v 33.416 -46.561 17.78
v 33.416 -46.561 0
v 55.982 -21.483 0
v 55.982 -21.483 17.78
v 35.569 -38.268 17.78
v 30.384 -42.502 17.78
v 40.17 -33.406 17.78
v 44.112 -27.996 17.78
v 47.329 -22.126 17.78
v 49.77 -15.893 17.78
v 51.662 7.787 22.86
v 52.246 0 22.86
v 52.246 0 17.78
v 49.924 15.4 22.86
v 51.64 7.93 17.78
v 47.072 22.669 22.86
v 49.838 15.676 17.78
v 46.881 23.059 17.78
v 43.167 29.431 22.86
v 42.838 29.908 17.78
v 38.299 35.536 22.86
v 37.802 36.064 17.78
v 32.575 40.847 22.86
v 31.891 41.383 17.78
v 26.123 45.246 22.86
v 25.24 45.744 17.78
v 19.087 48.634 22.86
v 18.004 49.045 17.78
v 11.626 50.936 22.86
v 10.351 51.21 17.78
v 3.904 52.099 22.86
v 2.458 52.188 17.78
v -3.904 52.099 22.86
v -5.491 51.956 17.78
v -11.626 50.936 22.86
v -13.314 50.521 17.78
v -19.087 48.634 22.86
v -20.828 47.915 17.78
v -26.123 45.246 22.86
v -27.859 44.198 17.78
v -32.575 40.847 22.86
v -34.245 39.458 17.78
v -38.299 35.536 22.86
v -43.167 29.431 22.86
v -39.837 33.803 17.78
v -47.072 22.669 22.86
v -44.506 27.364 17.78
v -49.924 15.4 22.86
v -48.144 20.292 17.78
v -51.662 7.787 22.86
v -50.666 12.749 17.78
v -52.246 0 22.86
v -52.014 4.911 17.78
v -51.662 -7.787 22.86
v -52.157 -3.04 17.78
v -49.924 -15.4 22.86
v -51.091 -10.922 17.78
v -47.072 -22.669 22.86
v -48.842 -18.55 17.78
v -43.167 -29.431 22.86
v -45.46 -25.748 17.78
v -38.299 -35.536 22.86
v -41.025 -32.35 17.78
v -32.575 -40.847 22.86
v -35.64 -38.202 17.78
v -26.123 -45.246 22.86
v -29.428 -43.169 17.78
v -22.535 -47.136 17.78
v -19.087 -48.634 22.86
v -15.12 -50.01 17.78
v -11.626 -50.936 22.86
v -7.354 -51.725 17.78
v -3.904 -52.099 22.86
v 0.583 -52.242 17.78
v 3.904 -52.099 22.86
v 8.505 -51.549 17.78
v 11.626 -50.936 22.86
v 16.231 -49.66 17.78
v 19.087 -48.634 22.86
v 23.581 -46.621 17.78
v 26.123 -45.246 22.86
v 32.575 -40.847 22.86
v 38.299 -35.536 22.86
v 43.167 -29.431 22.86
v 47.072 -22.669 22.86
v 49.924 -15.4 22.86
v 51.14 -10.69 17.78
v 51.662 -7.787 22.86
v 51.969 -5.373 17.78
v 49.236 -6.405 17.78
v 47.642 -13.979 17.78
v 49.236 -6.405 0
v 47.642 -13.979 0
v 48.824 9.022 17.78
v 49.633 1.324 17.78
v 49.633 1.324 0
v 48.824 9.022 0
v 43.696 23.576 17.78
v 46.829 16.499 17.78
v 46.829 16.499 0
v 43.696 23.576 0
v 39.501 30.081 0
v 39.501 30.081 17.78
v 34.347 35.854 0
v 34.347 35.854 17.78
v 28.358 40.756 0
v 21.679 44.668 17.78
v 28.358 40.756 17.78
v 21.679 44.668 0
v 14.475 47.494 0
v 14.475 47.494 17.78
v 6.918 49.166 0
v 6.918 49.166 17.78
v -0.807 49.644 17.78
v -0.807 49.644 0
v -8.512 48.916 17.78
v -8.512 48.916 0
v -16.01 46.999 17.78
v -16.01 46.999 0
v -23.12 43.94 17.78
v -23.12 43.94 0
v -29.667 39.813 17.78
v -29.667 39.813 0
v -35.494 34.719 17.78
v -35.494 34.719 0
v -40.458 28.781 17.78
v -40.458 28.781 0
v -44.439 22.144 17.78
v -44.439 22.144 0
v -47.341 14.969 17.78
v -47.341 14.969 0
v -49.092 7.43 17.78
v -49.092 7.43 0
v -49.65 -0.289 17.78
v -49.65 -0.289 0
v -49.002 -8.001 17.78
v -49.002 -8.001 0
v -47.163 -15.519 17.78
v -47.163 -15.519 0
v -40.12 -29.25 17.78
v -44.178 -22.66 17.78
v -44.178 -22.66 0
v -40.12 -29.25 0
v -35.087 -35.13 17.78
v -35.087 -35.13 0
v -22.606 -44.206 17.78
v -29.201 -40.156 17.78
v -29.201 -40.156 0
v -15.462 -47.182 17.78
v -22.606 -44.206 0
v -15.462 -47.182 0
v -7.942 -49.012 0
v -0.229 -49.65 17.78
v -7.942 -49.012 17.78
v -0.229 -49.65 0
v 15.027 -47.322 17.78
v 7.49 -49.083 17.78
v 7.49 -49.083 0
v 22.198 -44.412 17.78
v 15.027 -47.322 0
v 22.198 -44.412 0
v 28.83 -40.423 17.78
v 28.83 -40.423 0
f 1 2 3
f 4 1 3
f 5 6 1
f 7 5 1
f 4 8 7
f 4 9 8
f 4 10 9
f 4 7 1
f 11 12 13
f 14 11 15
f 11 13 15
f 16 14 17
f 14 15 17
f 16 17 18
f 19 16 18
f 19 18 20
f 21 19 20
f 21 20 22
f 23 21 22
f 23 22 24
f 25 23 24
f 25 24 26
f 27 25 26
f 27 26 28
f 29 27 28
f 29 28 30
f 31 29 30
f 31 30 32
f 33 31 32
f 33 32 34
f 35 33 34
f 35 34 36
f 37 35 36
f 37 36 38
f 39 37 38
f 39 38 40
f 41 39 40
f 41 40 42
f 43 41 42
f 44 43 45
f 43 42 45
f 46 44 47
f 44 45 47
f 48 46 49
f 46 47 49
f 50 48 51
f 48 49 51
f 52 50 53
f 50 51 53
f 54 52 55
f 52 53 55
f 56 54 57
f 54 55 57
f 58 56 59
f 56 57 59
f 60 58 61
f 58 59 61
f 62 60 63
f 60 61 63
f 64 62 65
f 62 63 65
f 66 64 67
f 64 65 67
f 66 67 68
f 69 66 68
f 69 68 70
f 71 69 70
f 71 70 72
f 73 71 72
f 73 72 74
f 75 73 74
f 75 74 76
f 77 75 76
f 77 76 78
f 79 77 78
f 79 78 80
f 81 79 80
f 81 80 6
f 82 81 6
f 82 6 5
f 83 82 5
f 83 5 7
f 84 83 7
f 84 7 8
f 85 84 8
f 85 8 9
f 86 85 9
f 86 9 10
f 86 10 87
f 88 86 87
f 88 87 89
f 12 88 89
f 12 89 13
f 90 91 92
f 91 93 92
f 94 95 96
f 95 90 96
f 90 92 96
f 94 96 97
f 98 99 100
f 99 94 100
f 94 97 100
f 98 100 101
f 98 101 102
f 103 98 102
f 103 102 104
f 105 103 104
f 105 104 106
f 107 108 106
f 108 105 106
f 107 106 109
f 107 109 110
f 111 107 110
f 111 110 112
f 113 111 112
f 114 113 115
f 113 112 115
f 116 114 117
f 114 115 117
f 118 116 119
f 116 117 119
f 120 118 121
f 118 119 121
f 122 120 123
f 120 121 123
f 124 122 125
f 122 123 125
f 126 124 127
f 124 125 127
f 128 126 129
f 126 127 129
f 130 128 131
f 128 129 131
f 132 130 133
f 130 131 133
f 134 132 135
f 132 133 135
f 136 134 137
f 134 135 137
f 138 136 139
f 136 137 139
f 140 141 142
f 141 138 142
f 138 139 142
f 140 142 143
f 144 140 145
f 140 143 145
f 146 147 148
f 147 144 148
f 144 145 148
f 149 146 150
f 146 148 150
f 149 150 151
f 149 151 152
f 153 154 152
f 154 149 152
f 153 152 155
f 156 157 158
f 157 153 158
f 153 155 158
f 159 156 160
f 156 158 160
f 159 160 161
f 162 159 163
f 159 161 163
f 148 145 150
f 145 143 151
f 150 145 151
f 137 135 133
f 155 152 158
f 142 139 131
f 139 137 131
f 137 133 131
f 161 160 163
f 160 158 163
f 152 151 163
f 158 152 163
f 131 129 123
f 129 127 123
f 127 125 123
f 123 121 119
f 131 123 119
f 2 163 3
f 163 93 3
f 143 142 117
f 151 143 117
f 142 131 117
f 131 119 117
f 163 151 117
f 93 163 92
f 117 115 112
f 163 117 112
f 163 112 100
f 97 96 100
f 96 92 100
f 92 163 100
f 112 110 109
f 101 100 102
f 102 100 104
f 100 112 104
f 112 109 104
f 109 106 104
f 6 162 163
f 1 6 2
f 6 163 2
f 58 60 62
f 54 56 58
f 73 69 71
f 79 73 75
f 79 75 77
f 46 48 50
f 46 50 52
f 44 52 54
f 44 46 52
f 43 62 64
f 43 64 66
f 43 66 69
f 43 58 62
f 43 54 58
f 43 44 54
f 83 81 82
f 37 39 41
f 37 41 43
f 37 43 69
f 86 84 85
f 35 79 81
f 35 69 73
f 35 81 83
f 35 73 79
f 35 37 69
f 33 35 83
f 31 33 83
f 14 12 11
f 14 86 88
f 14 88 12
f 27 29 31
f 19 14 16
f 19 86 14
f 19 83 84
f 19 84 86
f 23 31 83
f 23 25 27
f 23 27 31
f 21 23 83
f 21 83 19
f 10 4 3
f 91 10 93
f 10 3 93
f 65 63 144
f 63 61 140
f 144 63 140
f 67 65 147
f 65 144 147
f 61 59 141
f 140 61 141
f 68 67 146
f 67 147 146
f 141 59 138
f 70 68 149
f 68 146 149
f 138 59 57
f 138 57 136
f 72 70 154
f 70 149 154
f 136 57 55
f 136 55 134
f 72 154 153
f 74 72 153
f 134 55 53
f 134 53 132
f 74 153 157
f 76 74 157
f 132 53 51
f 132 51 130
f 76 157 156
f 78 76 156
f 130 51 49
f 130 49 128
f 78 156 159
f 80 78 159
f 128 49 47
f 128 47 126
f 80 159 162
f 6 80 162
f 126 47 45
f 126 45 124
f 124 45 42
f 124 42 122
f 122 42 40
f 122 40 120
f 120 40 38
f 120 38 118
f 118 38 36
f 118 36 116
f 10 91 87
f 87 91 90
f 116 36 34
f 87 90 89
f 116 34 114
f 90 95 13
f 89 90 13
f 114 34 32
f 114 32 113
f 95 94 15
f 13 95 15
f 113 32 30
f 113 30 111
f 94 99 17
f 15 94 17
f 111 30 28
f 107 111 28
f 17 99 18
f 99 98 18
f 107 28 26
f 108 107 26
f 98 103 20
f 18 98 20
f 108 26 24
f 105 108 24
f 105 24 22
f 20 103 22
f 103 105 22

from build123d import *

# Parameters (mm, degrees)
F0_R     = 49.650765
F1_DEPTH = 17.78
F2_R     = 52.245566
F3_DEPTH = 5.08
F5_DEPTH = 17.78


with BuildPart() as f1:
    # F0 (on Top) → F1 (new body)
    with BuildSketch(Plane.XY):
        Circle(F0_R)
    extrude(amount=F1_DEPTH)

    # F2 (on face) → F3 (join)
    with BuildSketch(Plane.XY.offset(17.78)):
        Circle(F2_R)
    extrude(amount=F3_DEPTH)

    # F4 (on Top) → F5 (join)
    with BuildSketch(Plane.XY):
        Polygon((46.185026, -12.667159), (24.616234, -34.781907), (33.415832, -46.560664), (55.981882, -21.482732), align=None)
    extrude(amount=F5_DEPTH)


solid = f1.part
